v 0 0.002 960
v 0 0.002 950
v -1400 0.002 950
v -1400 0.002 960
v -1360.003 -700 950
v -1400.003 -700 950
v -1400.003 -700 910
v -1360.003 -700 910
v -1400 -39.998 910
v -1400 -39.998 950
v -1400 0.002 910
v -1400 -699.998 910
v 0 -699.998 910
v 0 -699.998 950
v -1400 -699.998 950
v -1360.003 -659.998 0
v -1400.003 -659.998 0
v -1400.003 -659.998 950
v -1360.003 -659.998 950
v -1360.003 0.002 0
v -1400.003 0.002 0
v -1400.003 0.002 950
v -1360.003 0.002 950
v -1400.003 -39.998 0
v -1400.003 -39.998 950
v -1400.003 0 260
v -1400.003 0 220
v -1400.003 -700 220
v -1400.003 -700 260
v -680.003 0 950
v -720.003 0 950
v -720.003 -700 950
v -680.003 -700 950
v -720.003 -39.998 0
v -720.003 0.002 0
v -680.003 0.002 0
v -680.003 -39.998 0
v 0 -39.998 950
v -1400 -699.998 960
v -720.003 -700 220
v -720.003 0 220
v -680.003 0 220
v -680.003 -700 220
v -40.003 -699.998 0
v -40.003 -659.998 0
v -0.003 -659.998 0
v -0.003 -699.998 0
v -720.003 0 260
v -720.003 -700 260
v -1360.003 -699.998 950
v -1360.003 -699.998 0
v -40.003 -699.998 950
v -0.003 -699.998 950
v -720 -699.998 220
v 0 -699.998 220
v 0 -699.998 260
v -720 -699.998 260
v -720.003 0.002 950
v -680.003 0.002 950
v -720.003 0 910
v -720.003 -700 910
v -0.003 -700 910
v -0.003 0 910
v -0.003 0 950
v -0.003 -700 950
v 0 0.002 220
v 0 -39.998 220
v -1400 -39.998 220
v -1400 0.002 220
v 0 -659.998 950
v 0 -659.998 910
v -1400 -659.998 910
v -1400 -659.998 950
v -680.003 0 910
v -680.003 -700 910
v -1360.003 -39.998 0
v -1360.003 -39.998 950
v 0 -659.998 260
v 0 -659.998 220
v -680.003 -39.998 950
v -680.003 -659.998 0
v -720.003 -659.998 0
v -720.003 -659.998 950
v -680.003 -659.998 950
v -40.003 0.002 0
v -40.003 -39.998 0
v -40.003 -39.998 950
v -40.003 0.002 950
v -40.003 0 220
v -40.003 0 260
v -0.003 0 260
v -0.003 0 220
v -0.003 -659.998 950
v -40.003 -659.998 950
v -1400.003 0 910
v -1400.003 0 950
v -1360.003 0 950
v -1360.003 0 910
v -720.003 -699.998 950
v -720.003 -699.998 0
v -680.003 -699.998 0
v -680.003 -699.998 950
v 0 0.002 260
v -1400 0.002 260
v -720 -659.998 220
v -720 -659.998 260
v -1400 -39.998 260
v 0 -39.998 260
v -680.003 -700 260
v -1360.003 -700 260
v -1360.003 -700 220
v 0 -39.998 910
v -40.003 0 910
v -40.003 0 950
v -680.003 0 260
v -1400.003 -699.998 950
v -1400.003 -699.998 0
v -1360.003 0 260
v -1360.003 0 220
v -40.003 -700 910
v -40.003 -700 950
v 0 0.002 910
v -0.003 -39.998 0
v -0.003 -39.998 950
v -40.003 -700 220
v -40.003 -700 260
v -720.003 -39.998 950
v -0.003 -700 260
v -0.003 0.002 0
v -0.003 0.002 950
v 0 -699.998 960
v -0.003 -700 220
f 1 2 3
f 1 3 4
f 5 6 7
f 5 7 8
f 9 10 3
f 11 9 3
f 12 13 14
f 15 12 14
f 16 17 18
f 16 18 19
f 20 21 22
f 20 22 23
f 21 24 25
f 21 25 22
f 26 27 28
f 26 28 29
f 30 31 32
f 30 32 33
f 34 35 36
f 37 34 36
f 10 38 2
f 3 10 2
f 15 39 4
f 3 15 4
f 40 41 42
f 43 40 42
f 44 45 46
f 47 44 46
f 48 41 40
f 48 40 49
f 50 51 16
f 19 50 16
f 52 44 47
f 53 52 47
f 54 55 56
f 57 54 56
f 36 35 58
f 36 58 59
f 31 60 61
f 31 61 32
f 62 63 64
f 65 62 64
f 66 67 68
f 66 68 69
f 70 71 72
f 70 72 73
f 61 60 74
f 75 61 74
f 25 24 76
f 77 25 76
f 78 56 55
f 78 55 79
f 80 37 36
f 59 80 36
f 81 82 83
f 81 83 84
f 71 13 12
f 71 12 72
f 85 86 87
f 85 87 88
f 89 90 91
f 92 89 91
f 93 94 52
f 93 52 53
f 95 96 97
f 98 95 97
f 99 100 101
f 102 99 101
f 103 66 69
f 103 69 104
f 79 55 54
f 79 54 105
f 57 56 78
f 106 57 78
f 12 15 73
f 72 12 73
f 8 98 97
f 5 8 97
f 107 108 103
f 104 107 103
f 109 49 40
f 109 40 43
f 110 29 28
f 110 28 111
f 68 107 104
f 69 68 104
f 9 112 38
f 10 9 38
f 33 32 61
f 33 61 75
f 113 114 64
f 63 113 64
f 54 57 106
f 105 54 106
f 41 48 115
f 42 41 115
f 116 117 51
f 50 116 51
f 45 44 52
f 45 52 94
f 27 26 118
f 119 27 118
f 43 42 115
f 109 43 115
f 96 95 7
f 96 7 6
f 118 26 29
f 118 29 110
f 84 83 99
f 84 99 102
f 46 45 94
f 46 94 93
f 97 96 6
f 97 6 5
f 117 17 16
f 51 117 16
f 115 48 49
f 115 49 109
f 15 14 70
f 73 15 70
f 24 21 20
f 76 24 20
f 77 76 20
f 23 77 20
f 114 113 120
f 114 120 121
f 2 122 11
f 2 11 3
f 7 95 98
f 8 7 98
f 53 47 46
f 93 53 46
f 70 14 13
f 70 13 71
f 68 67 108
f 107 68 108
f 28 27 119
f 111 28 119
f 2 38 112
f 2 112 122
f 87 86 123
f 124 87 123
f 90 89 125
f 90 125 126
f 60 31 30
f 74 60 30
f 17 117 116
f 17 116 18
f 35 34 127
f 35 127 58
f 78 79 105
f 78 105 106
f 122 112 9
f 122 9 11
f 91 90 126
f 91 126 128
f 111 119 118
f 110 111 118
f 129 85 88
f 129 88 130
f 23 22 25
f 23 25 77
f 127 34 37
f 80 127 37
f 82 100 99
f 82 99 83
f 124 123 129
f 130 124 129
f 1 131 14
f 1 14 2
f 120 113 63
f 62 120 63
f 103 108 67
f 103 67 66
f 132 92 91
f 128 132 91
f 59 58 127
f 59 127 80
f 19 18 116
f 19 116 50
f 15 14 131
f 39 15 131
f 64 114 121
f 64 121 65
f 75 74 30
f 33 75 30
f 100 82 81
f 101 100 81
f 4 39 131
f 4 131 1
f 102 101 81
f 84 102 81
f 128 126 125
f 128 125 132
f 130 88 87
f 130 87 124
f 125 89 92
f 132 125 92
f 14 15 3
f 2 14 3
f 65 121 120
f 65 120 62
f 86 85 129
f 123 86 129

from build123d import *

# Parameters (mm, degrees)
F0_W     = 40
F0_H     = 40
F1_DEPTH = 950
F2_W     = 40
F2_H     = 40
F3_DEPTH = 720
F2_W_2   = 700
F2_H_2   = 10
F4_DEPTH = 1400
F5_W     = 40
F5_H     = 40
F6_DEPTH = 700
F7_W     = 40
F7_H     = 40
F8_DEPTH = 1400


# Not quite as in the source:
# - a feature names something its author has since deleted; it is built from what else it names


with BuildPart() as f1:
    # F0 (on Top) → F1 (new body)
    with BuildSketch(Plane.XY):
        with Locations((-1380.0028958117, -19.9983263365)):
            Rectangle(F0_W, F0_H)
    extrude(amount=F1_DEPTH)


with BuildPart() as f1b:
    # F0 (on Top) → F1, piece 2 (new body)
    with BuildSketch(Plane.XY):
        with Locations((-700.0028958117, -19.9983263365)):
            Rectangle(F0_W, F0_H)
    extrude(amount=F1_DEPTH)


with BuildPart() as f1c:
    # F0 (on Top) → F1, piece 3 (new body)
    with BuildSketch(Plane.XY):
        with Locations((-1380.0028958117, -679.9983263365)):
            Rectangle(F0_W, F0_H)
    extrude(amount=F1_DEPTH)


with BuildPart() as f1d:
    # F0 (on Top) → F1, piece 4 (new body)
    with BuildSketch(Plane.XY):
        with Locations((-700.0028958117, -679.9983263365)):
            Rectangle(F0_W, F0_H)
    extrude(amount=F1_DEPTH)


with BuildPart() as f1e:
    # F0 (on Top) → F1, piece 5 (new body)
    with BuildSketch(Plane.XY):
        with Locations((-20.0028958117, -679.9983263365)):
            Rectangle(F0_W, F0_H)
    extrude(amount=F1_DEPTH)


with BuildPart() as f1f:
    # F0 (on Top) → F1, piece 6 (new body)
    with BuildSketch(Plane.XY):
        with Locations((-20.0028958117, -19.9983263365)):
            Rectangle(F0_W, F0_H)
    extrude(amount=F1_DEPTH)


with BuildPart() as f3:
    # F2 (on Right) → F3 (new body)
    with BuildSketch(Plane.YZ):
        with Locations((-679.9983263365, 240)):
            Rectangle(F2_W, F2_H)
    extrude(amount=-F3_DEPTH)


with BuildPart() as f4:
    # F2 (on Right) → F4 (new body)
    with BuildSketch(Plane.YZ):
        with Locations((-349.9983263365, 955)):
            Rectangle(F2_W_2, F2_H_2)
    extrude(amount=-F4_DEPTH)


with BuildPart() as f4b:
    # F2 (on Right) → F4, piece 2 (new body)
    with BuildSketch(Plane.YZ):
        with Locations((-19.9983263365, 240)):
            Rectangle(F2_W, F2_H)
    extrude(amount=-F4_DEPTH)


with BuildPart() as f6:
    # F5 (on Front) → F6 (new body)
    with BuildSketch(Plane.XZ):
        with Locations((-20.0028958117, 240)):
            Rectangle(F5_W, F5_H)
    extrude(amount=F6_DEPTH)


with BuildPart() as f6b:
    # F5 (on Front) → F6, piece 2 (new body)
    with BuildSketch(Plane.XZ):
        with Locations((-700.0028958117, 240)):
            Rectangle(F5_W, F5_H)
    extrude(amount=F6_DEPTH)


with BuildPart() as f6c:
    # F5 (on Front) → F6, piece 3 (new body)
    with BuildSketch(Plane.XZ):
        with Locations((-1380.0028958117, 240)):
            Rectangle(F5_W, F5_H)
    extrude(amount=F6_DEPTH)


with BuildPart() as f6d:
    # F5 (on Front) → F6, piece 4 (new body)
    with BuildSketch(Plane.XZ):
        with Locations((-20.0028958117, 930)):
            Rectangle(F5_W, F5_H)
    extrude(amount=F6_DEPTH)


with BuildPart() as f6e:
    # F5 (on Front) → F6, piece 5 (new body)
    with BuildSketch(Plane.XZ):
        with Locations((-700.0028958117, 930)):
            Rectangle(F5_W, F5_H)
    extrude(amount=F6_DEPTH)


with BuildPart() as f6f:
    # F5 (on Front) → F6, piece 6 (new body)
    with BuildSketch(Plane.XZ):
        with Locations((-1380.0028958117, 930)):
            Rectangle(F5_W, F5_H)
    extrude(amount=F6_DEPTH)


with BuildPart() as f8:
    # F7 (on Right) → F8 (new body)
    with BuildSketch(Plane.YZ):
        with Locations((-679.9983263365, 930)):
            Rectangle(F7_W, F7_H)
    extrude(amount=-F8_DEPTH)


with BuildPart() as f8b:
    # F7 (on Right) → F8, piece 2 (new body)
    with BuildSketch(Plane.YZ):
        with Locations((-19.9983263365, 930)):
            Rectangle(F7_W, F7_H)
    extrude(amount=-F8_DEPTH)


solid = Compound([f1.part, f1b.part, f1c.part, f1d.part, f1e.part, f1f.part, f3.part, f4.part, f4b.part, f6.part, f6b.part, f6c.part, f6d.part, f6e.part, f6f.part, f8.part, f8b.part])
